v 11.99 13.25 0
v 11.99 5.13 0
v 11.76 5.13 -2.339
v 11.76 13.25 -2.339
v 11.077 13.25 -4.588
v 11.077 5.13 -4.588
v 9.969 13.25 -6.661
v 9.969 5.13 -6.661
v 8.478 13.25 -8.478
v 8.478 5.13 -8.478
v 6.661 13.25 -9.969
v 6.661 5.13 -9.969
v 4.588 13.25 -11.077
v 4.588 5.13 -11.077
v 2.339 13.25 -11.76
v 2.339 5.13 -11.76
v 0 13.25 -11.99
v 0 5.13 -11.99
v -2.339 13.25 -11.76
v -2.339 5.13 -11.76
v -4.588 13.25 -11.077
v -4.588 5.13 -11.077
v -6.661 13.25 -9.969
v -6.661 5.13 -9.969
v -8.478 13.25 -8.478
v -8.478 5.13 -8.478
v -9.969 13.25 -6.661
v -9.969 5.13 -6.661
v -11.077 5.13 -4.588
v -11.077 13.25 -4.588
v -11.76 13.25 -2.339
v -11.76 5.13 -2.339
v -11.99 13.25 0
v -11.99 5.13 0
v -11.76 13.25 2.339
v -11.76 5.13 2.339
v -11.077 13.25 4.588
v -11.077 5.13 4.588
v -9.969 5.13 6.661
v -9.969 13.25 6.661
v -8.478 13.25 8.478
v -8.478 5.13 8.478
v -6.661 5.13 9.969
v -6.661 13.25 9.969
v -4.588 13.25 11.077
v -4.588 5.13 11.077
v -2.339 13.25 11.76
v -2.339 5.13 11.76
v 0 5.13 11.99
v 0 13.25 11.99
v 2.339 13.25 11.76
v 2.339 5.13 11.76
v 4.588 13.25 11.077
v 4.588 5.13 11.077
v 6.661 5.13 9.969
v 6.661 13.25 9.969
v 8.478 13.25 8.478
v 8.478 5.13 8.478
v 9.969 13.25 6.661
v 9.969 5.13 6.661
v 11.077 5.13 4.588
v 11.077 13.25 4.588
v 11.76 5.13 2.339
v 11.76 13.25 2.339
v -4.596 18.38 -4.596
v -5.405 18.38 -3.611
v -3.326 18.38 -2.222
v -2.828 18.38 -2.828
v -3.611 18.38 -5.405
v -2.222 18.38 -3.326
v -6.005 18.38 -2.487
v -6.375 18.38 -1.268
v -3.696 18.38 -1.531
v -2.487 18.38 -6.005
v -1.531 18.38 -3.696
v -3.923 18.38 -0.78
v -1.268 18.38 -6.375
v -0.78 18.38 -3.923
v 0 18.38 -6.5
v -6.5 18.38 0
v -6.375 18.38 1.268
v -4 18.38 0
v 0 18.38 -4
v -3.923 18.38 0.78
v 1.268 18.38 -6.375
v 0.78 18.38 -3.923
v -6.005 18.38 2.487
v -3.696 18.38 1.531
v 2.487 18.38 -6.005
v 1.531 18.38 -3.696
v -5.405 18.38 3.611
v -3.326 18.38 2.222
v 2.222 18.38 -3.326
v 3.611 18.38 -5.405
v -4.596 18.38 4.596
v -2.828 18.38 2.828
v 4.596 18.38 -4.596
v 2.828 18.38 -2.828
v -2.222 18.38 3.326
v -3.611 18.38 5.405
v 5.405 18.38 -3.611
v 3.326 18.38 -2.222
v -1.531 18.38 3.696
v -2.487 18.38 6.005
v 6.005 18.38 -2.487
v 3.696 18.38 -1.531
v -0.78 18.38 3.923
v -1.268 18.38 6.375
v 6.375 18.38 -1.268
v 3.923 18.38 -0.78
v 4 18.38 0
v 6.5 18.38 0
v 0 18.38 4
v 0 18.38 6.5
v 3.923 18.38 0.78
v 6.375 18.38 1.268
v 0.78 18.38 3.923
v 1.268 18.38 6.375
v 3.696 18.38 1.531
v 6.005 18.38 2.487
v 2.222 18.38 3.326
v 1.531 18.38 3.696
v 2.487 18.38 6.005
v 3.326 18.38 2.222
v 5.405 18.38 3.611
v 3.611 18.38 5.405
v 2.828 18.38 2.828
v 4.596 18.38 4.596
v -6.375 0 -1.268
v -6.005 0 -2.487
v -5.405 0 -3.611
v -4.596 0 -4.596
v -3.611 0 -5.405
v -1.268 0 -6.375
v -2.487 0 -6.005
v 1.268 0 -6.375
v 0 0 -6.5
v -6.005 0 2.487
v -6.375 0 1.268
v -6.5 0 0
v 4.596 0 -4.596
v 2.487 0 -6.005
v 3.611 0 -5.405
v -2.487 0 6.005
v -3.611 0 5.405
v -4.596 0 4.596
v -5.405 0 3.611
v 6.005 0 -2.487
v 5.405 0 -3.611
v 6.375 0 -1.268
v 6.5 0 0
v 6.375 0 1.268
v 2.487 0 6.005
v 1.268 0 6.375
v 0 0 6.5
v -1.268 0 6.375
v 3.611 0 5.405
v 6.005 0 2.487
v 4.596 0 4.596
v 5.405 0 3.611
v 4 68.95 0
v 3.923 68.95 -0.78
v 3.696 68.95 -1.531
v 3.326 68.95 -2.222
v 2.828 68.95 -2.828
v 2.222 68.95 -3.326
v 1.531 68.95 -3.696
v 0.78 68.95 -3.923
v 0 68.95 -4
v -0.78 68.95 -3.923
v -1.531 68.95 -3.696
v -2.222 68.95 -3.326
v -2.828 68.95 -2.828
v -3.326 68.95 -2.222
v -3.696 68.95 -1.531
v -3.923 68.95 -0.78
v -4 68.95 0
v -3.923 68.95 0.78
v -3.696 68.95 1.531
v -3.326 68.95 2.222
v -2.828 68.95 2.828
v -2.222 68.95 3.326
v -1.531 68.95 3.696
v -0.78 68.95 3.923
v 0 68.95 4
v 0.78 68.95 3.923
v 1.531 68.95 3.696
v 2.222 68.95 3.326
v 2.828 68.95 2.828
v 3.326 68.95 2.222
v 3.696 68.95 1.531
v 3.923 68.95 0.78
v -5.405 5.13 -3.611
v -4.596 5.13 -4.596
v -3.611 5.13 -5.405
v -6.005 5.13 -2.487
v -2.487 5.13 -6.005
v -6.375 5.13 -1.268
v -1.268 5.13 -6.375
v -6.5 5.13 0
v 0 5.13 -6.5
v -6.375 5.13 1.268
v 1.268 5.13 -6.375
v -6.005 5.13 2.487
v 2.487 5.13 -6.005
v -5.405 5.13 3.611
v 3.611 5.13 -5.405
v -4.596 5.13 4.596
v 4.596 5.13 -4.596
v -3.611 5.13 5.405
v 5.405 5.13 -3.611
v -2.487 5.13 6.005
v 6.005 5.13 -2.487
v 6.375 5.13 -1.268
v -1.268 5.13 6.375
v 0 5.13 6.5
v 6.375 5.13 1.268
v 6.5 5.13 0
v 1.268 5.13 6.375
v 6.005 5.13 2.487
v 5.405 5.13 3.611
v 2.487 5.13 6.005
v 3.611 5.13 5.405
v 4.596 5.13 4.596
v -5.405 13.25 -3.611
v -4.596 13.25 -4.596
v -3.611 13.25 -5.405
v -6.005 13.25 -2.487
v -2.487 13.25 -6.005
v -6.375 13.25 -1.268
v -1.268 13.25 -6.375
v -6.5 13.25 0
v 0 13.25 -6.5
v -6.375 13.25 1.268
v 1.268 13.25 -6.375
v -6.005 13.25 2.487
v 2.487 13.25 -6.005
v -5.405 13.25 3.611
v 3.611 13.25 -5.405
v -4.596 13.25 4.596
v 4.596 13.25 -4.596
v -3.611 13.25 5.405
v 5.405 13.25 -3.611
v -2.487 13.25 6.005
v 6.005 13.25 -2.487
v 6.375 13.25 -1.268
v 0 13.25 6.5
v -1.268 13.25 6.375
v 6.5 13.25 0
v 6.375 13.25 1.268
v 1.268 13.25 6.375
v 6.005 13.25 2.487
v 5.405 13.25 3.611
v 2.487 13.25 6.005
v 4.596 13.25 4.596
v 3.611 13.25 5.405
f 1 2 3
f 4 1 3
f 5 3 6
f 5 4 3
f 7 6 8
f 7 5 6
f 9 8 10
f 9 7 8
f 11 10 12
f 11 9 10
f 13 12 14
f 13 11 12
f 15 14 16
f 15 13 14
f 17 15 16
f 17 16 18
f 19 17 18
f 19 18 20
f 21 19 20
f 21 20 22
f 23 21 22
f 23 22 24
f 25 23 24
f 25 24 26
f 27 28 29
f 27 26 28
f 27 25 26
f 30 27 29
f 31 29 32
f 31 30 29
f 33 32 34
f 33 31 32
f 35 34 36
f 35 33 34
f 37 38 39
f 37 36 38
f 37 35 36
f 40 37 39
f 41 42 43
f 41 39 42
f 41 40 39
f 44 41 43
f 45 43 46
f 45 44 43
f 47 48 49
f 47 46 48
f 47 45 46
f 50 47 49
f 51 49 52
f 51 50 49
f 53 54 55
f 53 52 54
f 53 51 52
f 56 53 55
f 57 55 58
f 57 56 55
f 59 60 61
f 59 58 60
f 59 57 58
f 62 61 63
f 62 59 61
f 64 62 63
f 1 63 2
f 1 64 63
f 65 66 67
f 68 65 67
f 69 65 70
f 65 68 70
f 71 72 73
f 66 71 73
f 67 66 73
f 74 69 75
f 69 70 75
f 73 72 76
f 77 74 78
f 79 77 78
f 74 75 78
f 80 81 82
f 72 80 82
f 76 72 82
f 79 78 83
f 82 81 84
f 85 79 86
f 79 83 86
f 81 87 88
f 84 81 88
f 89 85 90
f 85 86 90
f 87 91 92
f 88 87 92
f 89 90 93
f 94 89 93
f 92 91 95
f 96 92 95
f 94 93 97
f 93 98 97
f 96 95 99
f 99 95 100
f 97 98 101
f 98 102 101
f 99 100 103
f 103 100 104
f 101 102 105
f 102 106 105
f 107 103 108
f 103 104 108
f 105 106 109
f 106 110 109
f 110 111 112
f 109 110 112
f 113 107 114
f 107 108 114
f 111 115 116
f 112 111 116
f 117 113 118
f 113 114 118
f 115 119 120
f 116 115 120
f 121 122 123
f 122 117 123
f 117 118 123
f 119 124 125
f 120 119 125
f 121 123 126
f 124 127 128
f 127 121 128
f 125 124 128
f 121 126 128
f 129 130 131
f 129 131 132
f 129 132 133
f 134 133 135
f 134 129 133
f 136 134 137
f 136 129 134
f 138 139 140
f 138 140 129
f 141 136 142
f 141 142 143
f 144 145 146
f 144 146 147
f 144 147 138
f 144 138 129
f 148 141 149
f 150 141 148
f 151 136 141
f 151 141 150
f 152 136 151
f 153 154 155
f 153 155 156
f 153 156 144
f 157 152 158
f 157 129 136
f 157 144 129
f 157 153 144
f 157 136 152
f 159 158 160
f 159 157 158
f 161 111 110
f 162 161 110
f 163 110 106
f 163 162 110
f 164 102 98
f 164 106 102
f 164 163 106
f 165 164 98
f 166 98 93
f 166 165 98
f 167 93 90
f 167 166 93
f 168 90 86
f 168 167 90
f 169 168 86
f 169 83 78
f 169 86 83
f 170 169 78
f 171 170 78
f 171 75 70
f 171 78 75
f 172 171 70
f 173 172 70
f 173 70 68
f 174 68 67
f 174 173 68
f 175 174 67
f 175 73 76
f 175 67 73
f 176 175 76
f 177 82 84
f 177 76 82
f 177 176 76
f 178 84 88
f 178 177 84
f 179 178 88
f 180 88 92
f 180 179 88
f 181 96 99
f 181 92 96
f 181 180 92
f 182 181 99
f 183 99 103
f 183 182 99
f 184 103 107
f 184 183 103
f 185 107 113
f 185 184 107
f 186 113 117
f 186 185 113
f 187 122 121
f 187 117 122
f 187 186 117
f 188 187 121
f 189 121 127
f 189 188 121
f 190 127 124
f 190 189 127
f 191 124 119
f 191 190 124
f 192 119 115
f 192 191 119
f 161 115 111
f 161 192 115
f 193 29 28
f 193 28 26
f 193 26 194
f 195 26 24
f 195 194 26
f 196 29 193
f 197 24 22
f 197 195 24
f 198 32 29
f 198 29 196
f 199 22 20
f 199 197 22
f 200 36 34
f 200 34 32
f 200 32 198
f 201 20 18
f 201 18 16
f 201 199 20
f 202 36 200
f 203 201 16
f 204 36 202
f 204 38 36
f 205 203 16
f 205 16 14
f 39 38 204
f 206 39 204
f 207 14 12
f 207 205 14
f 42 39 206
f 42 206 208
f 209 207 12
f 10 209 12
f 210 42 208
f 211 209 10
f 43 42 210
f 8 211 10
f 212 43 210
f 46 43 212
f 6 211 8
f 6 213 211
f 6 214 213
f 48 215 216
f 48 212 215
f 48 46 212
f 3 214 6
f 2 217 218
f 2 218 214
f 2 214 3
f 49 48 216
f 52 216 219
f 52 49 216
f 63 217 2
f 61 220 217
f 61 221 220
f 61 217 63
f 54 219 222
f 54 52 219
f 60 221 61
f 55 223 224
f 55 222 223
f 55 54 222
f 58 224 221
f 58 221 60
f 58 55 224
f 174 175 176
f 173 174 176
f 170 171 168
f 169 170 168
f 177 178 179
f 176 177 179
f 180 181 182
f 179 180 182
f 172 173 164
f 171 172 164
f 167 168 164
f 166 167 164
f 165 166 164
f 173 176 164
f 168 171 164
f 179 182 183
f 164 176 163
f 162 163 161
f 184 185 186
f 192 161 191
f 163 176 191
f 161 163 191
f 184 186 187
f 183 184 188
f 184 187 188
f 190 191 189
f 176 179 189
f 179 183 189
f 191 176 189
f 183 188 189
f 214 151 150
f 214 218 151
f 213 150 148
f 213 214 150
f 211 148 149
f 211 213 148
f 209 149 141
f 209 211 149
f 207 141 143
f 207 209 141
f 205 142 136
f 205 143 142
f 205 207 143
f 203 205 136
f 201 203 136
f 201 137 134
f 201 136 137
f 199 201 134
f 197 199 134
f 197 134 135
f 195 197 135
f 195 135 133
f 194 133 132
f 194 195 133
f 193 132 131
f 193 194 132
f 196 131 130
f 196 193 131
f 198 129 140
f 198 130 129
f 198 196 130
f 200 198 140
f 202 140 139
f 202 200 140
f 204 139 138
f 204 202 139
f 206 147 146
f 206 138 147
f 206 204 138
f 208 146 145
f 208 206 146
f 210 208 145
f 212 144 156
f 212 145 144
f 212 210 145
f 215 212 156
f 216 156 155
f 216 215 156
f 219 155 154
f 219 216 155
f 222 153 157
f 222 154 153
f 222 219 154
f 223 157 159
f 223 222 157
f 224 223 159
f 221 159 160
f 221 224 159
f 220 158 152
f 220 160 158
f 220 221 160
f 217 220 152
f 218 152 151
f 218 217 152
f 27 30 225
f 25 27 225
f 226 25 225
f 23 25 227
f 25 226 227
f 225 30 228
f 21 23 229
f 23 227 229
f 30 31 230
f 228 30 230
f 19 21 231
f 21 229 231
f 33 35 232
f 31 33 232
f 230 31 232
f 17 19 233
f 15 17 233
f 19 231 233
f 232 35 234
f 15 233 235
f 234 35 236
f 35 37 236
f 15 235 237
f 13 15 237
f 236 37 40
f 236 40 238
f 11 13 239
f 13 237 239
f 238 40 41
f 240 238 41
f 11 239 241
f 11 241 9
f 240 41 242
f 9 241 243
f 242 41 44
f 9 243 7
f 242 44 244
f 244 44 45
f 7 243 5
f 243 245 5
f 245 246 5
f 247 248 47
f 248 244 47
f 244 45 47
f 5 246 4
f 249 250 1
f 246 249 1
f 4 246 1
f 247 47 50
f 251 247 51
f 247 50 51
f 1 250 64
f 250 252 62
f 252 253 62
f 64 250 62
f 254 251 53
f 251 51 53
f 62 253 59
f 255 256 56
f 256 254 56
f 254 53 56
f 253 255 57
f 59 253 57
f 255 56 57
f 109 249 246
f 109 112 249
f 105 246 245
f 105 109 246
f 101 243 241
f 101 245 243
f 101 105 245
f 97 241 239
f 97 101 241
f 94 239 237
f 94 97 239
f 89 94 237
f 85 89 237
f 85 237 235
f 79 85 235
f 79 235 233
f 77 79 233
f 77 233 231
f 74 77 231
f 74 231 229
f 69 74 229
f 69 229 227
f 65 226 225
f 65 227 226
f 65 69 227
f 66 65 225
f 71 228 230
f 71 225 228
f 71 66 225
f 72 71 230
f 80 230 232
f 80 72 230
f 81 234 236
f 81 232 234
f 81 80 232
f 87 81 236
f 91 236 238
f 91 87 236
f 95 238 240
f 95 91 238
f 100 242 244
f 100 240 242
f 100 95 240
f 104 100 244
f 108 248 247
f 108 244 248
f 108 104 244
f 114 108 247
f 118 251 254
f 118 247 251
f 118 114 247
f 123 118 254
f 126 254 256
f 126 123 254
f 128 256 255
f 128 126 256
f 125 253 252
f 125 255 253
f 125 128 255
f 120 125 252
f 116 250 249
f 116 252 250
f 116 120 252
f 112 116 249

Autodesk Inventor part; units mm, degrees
ref_plane "YZ Plane" through (0, 0, 0) normal (1, 0, 0) x (0, 1, 0)
ref_plane "XZ Plane" through (0, 0, 0) normal (0, 1, 0) x (-1, 0, 0)
ref_plane "XY Plane" through (0, 0, 0) normal (0, 0, 1) x (1, 0, 0)
sketch "Sketch1" plane through (0, 0, 0) normal (0, 0, 1) x (1, 0, 0)
  line L0 (0, 0) -> (6.5, 0)
  line L1 (6.5, 0) -> (6.5, 5.13)
  line L2 (6.5, 5.13) -> (11.99, 5.13)
  line L3 (11.99, 5.13) -> (11.99, 13.25)
  line L4 (11.99, 13.25) -> (6.5, 13.25)
  line L5 (6.5, 13.25) -> (6.5, 18.38)
  line L6 (6.5, 18.38) -> (4, 18.38)
  line L7 (4, 18.38) -> (4, 68.95)
  line L8 (4, 68.95) -> (0, 68.95)
  line L9 (0, 68.95) -> (0, 0)
  dimension "d0" = 4
  dimension "d2" = 68.95
  dimension "d3" = 8.12
  dimension "d4" = 5.13
  dimension "d5" = 5.13
  dimension "d6" = 11.99
  dimension "d7" = 6.5
revolve "Revolution1" add sketch "Sketch1" angle 360 about axis through (0, 68.95, 0) along (0, -1, 0)
thread "Thread1" size "M8x1.25" class "6g" standard "ANSI Metric M Profile" full length
properties part number "rod and bearing" material "Stainless Steel"
